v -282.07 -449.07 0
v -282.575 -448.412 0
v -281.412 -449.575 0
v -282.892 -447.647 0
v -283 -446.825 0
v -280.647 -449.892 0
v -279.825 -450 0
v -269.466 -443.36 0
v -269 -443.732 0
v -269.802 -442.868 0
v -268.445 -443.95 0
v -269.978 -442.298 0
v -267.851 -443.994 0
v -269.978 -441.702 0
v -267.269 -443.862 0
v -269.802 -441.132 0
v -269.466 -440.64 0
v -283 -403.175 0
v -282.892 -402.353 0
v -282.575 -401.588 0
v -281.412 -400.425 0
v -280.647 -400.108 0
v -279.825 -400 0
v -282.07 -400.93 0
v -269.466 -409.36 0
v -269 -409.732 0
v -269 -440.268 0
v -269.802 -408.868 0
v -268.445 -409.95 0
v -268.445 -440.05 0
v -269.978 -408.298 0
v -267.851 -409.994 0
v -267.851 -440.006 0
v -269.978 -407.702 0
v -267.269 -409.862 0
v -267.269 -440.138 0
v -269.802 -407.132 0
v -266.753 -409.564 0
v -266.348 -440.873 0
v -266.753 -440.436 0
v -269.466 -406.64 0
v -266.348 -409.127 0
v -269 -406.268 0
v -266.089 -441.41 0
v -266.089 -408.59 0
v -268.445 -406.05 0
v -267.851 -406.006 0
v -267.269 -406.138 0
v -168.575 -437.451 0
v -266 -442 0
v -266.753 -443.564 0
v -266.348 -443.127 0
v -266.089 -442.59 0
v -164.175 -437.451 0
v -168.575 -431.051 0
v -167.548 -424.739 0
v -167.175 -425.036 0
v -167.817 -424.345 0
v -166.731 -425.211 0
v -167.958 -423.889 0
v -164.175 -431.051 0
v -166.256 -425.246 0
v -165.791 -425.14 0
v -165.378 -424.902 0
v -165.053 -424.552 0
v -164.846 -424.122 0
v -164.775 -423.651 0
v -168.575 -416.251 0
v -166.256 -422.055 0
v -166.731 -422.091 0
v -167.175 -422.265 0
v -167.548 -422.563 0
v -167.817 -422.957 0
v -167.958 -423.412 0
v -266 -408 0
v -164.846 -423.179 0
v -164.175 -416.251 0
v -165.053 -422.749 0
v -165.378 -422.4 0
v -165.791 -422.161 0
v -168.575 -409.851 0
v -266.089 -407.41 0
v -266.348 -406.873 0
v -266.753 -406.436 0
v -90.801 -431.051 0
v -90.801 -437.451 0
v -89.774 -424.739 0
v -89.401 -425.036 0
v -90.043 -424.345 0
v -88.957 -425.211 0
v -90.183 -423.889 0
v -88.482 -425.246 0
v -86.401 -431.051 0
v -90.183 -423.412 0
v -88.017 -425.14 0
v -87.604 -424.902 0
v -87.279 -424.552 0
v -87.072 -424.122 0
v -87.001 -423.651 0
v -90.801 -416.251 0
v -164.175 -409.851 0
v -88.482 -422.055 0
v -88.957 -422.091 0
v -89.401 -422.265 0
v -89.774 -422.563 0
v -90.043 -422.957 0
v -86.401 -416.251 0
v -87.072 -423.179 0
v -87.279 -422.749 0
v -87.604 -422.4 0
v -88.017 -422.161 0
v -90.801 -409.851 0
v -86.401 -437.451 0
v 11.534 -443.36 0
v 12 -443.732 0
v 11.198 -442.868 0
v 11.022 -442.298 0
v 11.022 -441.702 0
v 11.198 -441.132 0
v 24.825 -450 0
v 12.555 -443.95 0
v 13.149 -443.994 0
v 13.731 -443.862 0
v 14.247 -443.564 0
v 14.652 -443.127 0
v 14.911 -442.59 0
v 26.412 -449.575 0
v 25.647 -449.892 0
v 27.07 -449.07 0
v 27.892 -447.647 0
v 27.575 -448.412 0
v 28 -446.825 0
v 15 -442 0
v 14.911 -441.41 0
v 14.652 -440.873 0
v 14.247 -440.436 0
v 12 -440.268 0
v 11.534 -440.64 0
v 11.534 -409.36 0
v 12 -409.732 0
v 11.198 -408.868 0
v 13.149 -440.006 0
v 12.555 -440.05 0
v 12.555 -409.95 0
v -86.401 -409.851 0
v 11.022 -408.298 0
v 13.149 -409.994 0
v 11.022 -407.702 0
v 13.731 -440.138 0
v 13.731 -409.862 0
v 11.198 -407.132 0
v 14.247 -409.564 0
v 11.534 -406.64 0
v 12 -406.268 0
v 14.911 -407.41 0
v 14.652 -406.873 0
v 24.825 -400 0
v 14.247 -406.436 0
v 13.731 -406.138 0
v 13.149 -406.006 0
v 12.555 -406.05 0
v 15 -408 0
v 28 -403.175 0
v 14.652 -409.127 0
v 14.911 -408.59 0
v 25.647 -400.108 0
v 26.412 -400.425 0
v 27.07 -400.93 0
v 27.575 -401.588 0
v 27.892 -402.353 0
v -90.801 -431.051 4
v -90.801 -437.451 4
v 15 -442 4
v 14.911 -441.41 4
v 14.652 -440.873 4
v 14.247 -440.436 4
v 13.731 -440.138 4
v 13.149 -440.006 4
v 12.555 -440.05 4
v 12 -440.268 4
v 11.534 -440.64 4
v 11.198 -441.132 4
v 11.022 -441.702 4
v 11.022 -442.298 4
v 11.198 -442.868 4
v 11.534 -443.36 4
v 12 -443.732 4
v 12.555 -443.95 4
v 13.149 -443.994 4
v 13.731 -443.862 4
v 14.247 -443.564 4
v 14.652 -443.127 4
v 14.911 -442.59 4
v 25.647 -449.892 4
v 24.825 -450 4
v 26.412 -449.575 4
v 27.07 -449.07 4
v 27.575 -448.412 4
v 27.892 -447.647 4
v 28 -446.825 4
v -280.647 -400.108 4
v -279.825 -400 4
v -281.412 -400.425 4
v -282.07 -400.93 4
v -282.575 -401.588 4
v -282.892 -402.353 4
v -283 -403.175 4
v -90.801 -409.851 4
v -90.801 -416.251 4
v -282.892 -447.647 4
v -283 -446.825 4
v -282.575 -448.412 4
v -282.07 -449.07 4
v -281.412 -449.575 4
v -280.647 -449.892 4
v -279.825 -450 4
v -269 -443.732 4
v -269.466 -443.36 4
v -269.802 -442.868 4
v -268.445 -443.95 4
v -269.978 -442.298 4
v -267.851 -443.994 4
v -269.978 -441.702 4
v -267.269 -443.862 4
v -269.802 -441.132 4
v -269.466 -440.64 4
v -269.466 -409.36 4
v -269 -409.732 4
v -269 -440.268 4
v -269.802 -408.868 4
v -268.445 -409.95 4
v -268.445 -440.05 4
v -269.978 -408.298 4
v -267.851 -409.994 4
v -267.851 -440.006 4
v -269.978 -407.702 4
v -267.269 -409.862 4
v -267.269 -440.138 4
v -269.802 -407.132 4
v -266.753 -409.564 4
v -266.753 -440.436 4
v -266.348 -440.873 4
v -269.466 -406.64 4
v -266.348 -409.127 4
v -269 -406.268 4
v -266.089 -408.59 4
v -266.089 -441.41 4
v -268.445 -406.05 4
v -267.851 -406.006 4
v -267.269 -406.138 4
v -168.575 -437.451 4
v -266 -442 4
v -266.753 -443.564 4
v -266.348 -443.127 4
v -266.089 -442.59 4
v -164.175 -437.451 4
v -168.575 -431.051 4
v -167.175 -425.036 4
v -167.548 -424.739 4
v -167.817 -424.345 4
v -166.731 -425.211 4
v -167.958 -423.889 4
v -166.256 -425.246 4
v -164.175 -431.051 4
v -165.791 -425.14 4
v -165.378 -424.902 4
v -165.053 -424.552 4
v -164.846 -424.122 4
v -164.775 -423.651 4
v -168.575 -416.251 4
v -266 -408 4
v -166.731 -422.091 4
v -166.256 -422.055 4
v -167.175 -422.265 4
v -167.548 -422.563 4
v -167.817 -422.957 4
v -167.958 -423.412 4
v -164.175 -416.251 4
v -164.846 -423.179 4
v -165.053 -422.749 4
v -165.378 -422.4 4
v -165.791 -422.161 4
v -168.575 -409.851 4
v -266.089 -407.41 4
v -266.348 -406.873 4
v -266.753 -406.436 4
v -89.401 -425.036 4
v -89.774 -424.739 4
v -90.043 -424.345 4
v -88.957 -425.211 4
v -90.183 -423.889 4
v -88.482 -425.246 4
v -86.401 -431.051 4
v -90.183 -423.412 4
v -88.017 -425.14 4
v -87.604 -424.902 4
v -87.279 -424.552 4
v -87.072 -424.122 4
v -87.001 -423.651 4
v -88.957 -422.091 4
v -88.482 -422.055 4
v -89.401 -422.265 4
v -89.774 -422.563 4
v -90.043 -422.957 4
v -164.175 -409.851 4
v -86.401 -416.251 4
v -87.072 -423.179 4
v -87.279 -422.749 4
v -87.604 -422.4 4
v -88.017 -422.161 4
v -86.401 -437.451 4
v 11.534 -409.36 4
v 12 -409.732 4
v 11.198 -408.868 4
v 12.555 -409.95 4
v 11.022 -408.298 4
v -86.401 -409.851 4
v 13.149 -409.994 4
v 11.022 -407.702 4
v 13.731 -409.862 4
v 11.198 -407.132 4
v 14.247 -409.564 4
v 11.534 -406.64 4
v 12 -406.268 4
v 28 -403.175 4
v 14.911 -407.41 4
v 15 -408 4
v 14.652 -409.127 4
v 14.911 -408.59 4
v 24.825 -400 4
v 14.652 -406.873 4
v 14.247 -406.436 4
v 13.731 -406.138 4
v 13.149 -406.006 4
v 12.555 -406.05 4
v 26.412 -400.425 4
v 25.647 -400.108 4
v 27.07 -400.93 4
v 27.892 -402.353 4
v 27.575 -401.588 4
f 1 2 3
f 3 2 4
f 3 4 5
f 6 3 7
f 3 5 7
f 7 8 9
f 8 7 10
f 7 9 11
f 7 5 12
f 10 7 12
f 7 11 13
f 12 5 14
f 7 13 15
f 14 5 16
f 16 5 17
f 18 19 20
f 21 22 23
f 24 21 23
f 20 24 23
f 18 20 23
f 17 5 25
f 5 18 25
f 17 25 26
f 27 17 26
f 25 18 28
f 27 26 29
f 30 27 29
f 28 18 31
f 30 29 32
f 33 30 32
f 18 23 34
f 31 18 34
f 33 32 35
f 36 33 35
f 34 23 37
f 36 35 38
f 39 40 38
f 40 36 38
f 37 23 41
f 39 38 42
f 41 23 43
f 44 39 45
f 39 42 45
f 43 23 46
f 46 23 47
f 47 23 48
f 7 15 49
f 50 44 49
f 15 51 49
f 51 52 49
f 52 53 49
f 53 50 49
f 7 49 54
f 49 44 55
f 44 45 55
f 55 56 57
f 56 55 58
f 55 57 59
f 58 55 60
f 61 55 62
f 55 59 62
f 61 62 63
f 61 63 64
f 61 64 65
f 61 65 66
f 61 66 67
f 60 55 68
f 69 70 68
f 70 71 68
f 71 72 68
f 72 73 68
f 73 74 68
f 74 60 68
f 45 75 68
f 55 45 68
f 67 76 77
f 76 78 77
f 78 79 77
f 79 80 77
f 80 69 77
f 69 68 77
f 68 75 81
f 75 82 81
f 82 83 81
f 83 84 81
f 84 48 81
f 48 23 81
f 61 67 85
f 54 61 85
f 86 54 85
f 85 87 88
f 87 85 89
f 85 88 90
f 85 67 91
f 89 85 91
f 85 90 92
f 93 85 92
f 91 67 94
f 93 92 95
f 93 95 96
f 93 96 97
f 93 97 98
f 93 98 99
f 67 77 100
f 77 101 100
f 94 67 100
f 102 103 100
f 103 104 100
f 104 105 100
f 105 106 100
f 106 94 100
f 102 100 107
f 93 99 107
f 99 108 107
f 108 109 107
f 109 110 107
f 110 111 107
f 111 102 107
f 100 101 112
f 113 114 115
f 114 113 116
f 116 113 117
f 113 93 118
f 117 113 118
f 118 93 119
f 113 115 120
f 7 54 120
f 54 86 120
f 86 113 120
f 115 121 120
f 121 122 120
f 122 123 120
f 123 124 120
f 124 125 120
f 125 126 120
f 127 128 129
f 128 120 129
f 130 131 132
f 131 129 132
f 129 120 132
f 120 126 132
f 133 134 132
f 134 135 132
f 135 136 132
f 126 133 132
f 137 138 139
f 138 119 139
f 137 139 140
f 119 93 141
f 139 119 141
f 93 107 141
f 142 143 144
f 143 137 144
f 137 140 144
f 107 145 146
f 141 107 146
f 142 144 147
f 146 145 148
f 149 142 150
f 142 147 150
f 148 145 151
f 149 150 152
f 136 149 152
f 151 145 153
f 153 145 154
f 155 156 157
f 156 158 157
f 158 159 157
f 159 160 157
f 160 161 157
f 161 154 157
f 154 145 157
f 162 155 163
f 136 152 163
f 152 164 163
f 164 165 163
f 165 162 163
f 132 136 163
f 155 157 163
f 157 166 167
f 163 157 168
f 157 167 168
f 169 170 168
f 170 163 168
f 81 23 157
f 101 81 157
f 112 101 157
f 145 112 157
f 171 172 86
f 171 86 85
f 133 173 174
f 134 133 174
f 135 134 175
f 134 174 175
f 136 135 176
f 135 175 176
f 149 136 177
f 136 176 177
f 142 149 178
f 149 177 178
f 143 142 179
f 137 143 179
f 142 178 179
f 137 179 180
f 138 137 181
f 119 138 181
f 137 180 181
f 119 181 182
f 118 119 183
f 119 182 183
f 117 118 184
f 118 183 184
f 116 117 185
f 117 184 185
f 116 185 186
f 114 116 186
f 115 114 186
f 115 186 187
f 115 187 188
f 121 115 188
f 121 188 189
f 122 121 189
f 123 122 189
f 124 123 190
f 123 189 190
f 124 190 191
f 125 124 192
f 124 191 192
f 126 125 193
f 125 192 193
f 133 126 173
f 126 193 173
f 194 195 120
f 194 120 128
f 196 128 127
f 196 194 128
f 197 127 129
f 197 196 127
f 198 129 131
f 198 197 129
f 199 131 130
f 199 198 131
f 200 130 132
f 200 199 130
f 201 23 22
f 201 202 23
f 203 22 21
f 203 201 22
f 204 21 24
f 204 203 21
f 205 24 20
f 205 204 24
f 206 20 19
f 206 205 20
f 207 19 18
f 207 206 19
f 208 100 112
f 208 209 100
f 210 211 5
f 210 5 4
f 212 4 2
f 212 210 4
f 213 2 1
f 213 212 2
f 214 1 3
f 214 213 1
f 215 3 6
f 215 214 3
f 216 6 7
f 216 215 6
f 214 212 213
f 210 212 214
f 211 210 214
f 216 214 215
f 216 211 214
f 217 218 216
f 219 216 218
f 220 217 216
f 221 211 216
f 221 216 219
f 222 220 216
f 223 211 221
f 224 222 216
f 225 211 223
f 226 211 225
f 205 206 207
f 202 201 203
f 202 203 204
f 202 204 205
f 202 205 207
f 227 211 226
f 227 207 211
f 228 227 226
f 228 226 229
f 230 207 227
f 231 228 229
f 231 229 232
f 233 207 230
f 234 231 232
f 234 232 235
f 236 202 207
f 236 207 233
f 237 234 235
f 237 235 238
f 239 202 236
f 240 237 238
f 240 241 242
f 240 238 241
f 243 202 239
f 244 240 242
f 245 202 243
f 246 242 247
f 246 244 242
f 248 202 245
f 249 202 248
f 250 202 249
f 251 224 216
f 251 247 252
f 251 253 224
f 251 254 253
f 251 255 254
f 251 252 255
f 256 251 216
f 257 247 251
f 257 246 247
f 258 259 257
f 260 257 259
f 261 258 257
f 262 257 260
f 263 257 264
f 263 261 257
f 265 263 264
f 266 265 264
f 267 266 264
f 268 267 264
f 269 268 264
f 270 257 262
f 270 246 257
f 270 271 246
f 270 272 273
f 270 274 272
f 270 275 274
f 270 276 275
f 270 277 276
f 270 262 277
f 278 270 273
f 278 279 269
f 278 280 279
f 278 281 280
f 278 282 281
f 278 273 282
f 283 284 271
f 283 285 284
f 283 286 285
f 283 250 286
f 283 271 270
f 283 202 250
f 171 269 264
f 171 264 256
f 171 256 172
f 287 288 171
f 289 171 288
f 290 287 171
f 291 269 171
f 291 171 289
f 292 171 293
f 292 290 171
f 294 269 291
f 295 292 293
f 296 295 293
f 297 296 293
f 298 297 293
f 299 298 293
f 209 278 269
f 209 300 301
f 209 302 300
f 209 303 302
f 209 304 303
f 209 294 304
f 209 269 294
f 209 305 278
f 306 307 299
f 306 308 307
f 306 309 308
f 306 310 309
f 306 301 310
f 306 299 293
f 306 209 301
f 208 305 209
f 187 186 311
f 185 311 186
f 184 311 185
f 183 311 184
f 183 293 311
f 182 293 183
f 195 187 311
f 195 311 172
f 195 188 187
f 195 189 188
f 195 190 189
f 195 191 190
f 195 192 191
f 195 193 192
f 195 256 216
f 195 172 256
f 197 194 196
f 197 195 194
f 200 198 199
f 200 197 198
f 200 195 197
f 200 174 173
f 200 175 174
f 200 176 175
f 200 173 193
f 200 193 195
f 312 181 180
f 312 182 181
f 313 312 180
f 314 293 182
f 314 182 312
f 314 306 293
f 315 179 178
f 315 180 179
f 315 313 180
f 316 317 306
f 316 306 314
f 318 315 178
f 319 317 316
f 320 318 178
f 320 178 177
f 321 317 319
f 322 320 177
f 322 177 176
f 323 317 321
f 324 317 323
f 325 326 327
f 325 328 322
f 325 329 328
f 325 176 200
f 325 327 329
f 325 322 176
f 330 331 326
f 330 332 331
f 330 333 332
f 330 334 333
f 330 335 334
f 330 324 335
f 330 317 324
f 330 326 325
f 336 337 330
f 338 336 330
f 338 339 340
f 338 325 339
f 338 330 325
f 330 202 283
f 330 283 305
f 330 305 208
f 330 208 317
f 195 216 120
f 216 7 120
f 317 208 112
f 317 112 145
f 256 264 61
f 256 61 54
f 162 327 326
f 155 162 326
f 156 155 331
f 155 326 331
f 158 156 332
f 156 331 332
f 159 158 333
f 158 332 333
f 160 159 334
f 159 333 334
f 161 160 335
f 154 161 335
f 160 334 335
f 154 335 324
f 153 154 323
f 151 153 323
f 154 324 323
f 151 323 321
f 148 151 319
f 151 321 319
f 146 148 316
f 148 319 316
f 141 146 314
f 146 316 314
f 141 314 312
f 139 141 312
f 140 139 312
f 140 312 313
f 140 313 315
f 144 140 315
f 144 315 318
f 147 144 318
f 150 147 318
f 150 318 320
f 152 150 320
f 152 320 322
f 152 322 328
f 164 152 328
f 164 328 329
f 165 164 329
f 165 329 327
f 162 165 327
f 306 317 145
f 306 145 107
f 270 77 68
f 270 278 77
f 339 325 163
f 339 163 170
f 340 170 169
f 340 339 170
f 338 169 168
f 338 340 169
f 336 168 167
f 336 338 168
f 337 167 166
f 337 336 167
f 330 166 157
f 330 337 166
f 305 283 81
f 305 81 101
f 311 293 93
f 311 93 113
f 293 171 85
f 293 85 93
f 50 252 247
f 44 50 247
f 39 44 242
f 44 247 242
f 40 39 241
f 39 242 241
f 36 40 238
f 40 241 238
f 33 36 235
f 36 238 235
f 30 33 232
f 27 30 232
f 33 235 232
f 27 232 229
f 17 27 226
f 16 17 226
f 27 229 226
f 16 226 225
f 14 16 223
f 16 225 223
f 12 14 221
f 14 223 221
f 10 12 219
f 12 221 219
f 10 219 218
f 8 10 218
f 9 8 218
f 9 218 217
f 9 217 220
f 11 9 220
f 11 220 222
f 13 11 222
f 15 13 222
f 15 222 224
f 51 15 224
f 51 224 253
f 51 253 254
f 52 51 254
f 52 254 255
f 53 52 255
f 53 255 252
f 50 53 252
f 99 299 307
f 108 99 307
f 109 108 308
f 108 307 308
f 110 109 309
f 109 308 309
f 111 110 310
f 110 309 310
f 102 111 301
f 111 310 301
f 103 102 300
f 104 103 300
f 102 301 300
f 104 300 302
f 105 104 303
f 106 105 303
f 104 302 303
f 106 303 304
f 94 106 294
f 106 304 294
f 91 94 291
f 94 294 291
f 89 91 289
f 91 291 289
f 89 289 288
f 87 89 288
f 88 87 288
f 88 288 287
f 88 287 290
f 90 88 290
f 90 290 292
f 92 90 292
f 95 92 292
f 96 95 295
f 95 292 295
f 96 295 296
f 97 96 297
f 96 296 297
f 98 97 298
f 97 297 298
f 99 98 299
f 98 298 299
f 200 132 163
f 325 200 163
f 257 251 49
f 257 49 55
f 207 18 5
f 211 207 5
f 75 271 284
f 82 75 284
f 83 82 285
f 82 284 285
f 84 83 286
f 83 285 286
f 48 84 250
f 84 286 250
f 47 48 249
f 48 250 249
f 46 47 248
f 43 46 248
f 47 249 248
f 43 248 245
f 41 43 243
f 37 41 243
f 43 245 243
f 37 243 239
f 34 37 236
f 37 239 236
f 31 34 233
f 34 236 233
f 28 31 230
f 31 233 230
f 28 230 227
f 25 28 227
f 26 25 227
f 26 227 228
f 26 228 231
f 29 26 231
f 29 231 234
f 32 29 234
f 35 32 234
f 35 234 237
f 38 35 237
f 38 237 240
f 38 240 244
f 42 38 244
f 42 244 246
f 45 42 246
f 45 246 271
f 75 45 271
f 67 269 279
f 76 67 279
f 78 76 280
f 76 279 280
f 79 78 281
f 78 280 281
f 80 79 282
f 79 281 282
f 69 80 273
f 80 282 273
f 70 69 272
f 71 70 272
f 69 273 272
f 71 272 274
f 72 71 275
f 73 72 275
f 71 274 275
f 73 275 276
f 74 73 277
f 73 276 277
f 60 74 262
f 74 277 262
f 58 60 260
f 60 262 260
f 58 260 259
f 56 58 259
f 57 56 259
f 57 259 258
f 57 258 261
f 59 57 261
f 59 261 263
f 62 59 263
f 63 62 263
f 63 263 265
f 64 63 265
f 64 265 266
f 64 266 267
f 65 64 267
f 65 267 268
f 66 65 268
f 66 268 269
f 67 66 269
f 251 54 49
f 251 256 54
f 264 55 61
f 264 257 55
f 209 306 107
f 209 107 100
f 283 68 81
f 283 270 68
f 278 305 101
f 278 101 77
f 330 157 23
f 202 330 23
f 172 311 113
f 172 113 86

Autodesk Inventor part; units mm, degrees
ref_plane "YZ Plane" through (0, 0, 0) normal (1, 0, 0) x (0, 1, 0)
ref_plane "XZ Plane" through (0, 0, 0) normal (0, 1, 0) x (-1, 0, 0)
ref_plane "XY Plane" through (0, 0, 0) normal (0, 0, 1) x (1, 0, 0)
sketch "Sketch1" plane through (0, 0, 0) normal (0, 0, 1) x (1, 0, 0)
  line L0 (-283, 0) -> (-283, -900) projected
  line L1 (28, 100) -> (28, -900) construction
  line L2 (-283, -450) -> (28, -450)
  line L3 (28, -450) -> (28, -400)
  line L4 (28, -400) -> (-283, -400)
  line L5 (-283, -400) -> (-283, -450)
  line L6 (28, 0) -> (28, -900) projected
  point P0 (0, 0)
  dimension "d0" = 50
extrude "Extrusion1" add sketch "Sketch1" along normal blind 4
fillet "Fillet1" radius 3.175 4 edges at (-283, -450, 2) (-283, -400, 2) (28, -450, 2) (28, -400, 2)
sketch "Sketch2" plane through (0, 0, 4) normal (0, 0, 1) x (1, 0, 0)
  line L0 (-90.6012, -437.2508) -> (-90.6012, -431.2508) construction
  line L1 (-90.6012, -437.2508) -> (-86.6012, -437.2508) construction
  line L2 (-86.6012, -431.2508) -> (-86.6012, -437.2508) construction
  line L3 (-90.6012, -431.2508) -> (-86.6012, -431.2508) construction
  line L4 (-90.6012, -416.0508) -> (-90.6012, -410.0508) construction
  line L5 (-90.6012, -416.0508) -> (-86.6012, -416.0508) construction
  line L6 (-86.6012, -410.0508) -> (-86.6012, -416.0508) construction
  line L7 (-90.6012, -410.0508) -> (-86.6012, -410.0508) construction
  line L8 (-168.3754, -437.2508) -> (-168.3754, -431.2508) construction
  line L9 (-168.3754, -437.2508) -> (-164.3754, -437.2508) construction
  line L10 (-164.3754, -431.2508) -> (-164.3754, -437.2508) construction
  line L11 (-168.3754, -431.2508) -> (-164.3754, -431.2508) construction
  line L12 (-168.3754, -416.0508) -> (-168.3754, -410.0508) construction
  line L13 (-168.3754, -416.0508) -> (-164.3754, -416.0508) construction
  line L14 (-164.3754, -410.0508) -> (-164.3754, -416.0508) construction
  line L15 (-168.3754, -410.0508) -> (-164.3754, -410.0508) construction
  line L16 (-112.9543, -436.0142) -> (-107.1133, -436.0142) construction
  line L17 (-168.3754, -425.1508) -> (-168.3754, -422.1508) construction
  line L18 (-168.3754, -425.1508) -> (-168.3754, -422.1508) construction
  line L19 (-168.3754, -425.1508) -> (-164.3754, -425.1508) construction
  line L20 (-164.3754, -422.1508) -> (-164.3754, -425.1508) construction
  line L21 (-168.3754, -422.1508) -> (-164.3754, -422.1508) construction
  line L22 (-90.6012, -425.1508) -> (-90.6012, -422.1508) construction
  line L23 (-90.6012, -425.1508) -> (-86.6012, -425.1508) construction
  line L24 (-86.6012, -422.1508) -> (-86.6012, -425.1508) construction
  line L25 (-90.6012, -422.1508) -> (-86.6012, -422.1508) construction
  line L26 (-86.4012, -431.0508) -> (-86.4012, -437.4508)
  line L27 (-86.4012, -437.4508) -> (-90.8012, -437.4508)
  line L28 (-90.8012, -437.4508) -> (-90.8012, -431.0508)
  line L29 (-90.8012, -431.0508) -> (-86.4012, -431.0508)
  line L30 (-86.4012, -416.2508) -> (-90.8012, -416.2508)
  line L31 (-90.8012, -416.2508) -> (-90.8012, -409.8508)
  line L32 (-90.8012, -409.8508) -> (-86.4012, -409.8508)
  line L33 (-86.4012, -409.8508) -> (-86.4012, -416.2508)
  line L34 (-164.1754, -437.4508) -> (-168.5754, -437.4508)
  line L35 (-168.5754, -437.4508) -> (-168.5754, -431.0508)
  line L36 (-168.5754, -431.0508) -> (-164.1754, -431.0508)
  line L37 (-164.1754, -431.0508) -> (-164.1754, -437.4508)
  line L38 (-164.1754, -416.2508) -> (-168.5754, -416.2508)
  line L39 (-168.5754, -416.2508) -> (-168.5754, -409.8508)
  line L40 (-168.5754, -409.8508) -> (-164.1754, -409.8508)
  line L41 (-164.1754, -409.8508) -> (-164.1754, -416.2508)
  circle A0 centre (-166.3754, -423.6508) radius 1.6
  circle A1 centre (-88.6012, -423.6508) radius 1.6
  point P0 (0, 0)
  dimension "d4" = 0.2
  dimension "d5" = 0.2
  dimension "d6" = 0.2
  dimension "d7" = 0.2
  dimension "d8" = 3.2
  dimension "d9" = 3.2
extrude "Extrusion2" cut sketch "Sketch2" against normal through all
sketch "Sketch3" plane through (0, 0, 4) normal (0, 0, 1) x (1, 0, 0)
  line L0 (17.1, 100) -> (17.1, -900) projected
  line L1 (8.9, 100) -> (17.1, 100) projected
  line L2 (8.9, 100) -> (8.9, -900) projected
  line L3 (17.1, -900) -> (8.9, -900) projected
  line L4 (-263.9, 100) -> (-263.9, -900) projected
  line L5 (-272.1, 100) -> (-263.9, 100) projected
  line L6 (-272.1, 100) -> (-272.1, -900) projected
  line L7 (-263.9, -900) -> (-272.1, -900) projected
  line L8 (55.4545, -442) -> (-299.148, -442) construction
  line L9 (72.1451, -408) -> (-299.148, -408) construction
  line L10 (-279.825, -450) -> (24.825, -450) construction
  line L11 (24.825, -400) -> (-279.825, -400) construction
  line L12 (13, -462.5908) -> (13, -387.796) construction
  line L13 (-268, -463.1777) -> (-268, -383.364) construction
  circle A0 centre (13, -442) radius 2
  circle A1 centre (13, -408) radius 2
  circle A2 centre (-268, -442) radius 2
  circle A3 centre (-268, -408) radius 2
  point P0 (0, 0)
  point P1 (-268, -900)
  point P2 (13, -900)
  dimension "d12" = 8
  dimension "d13" = 8
  dimension "d14" = 4
  dimension "d15" = 4
  dimension "d16" = 4
  dimension "d17" = 4
extrude "Extrusion3" cut sketch "Sketch3" against normal blind 4 contours A0 | A1 | A2 | A3
properties part number "Motor Brace_1"
